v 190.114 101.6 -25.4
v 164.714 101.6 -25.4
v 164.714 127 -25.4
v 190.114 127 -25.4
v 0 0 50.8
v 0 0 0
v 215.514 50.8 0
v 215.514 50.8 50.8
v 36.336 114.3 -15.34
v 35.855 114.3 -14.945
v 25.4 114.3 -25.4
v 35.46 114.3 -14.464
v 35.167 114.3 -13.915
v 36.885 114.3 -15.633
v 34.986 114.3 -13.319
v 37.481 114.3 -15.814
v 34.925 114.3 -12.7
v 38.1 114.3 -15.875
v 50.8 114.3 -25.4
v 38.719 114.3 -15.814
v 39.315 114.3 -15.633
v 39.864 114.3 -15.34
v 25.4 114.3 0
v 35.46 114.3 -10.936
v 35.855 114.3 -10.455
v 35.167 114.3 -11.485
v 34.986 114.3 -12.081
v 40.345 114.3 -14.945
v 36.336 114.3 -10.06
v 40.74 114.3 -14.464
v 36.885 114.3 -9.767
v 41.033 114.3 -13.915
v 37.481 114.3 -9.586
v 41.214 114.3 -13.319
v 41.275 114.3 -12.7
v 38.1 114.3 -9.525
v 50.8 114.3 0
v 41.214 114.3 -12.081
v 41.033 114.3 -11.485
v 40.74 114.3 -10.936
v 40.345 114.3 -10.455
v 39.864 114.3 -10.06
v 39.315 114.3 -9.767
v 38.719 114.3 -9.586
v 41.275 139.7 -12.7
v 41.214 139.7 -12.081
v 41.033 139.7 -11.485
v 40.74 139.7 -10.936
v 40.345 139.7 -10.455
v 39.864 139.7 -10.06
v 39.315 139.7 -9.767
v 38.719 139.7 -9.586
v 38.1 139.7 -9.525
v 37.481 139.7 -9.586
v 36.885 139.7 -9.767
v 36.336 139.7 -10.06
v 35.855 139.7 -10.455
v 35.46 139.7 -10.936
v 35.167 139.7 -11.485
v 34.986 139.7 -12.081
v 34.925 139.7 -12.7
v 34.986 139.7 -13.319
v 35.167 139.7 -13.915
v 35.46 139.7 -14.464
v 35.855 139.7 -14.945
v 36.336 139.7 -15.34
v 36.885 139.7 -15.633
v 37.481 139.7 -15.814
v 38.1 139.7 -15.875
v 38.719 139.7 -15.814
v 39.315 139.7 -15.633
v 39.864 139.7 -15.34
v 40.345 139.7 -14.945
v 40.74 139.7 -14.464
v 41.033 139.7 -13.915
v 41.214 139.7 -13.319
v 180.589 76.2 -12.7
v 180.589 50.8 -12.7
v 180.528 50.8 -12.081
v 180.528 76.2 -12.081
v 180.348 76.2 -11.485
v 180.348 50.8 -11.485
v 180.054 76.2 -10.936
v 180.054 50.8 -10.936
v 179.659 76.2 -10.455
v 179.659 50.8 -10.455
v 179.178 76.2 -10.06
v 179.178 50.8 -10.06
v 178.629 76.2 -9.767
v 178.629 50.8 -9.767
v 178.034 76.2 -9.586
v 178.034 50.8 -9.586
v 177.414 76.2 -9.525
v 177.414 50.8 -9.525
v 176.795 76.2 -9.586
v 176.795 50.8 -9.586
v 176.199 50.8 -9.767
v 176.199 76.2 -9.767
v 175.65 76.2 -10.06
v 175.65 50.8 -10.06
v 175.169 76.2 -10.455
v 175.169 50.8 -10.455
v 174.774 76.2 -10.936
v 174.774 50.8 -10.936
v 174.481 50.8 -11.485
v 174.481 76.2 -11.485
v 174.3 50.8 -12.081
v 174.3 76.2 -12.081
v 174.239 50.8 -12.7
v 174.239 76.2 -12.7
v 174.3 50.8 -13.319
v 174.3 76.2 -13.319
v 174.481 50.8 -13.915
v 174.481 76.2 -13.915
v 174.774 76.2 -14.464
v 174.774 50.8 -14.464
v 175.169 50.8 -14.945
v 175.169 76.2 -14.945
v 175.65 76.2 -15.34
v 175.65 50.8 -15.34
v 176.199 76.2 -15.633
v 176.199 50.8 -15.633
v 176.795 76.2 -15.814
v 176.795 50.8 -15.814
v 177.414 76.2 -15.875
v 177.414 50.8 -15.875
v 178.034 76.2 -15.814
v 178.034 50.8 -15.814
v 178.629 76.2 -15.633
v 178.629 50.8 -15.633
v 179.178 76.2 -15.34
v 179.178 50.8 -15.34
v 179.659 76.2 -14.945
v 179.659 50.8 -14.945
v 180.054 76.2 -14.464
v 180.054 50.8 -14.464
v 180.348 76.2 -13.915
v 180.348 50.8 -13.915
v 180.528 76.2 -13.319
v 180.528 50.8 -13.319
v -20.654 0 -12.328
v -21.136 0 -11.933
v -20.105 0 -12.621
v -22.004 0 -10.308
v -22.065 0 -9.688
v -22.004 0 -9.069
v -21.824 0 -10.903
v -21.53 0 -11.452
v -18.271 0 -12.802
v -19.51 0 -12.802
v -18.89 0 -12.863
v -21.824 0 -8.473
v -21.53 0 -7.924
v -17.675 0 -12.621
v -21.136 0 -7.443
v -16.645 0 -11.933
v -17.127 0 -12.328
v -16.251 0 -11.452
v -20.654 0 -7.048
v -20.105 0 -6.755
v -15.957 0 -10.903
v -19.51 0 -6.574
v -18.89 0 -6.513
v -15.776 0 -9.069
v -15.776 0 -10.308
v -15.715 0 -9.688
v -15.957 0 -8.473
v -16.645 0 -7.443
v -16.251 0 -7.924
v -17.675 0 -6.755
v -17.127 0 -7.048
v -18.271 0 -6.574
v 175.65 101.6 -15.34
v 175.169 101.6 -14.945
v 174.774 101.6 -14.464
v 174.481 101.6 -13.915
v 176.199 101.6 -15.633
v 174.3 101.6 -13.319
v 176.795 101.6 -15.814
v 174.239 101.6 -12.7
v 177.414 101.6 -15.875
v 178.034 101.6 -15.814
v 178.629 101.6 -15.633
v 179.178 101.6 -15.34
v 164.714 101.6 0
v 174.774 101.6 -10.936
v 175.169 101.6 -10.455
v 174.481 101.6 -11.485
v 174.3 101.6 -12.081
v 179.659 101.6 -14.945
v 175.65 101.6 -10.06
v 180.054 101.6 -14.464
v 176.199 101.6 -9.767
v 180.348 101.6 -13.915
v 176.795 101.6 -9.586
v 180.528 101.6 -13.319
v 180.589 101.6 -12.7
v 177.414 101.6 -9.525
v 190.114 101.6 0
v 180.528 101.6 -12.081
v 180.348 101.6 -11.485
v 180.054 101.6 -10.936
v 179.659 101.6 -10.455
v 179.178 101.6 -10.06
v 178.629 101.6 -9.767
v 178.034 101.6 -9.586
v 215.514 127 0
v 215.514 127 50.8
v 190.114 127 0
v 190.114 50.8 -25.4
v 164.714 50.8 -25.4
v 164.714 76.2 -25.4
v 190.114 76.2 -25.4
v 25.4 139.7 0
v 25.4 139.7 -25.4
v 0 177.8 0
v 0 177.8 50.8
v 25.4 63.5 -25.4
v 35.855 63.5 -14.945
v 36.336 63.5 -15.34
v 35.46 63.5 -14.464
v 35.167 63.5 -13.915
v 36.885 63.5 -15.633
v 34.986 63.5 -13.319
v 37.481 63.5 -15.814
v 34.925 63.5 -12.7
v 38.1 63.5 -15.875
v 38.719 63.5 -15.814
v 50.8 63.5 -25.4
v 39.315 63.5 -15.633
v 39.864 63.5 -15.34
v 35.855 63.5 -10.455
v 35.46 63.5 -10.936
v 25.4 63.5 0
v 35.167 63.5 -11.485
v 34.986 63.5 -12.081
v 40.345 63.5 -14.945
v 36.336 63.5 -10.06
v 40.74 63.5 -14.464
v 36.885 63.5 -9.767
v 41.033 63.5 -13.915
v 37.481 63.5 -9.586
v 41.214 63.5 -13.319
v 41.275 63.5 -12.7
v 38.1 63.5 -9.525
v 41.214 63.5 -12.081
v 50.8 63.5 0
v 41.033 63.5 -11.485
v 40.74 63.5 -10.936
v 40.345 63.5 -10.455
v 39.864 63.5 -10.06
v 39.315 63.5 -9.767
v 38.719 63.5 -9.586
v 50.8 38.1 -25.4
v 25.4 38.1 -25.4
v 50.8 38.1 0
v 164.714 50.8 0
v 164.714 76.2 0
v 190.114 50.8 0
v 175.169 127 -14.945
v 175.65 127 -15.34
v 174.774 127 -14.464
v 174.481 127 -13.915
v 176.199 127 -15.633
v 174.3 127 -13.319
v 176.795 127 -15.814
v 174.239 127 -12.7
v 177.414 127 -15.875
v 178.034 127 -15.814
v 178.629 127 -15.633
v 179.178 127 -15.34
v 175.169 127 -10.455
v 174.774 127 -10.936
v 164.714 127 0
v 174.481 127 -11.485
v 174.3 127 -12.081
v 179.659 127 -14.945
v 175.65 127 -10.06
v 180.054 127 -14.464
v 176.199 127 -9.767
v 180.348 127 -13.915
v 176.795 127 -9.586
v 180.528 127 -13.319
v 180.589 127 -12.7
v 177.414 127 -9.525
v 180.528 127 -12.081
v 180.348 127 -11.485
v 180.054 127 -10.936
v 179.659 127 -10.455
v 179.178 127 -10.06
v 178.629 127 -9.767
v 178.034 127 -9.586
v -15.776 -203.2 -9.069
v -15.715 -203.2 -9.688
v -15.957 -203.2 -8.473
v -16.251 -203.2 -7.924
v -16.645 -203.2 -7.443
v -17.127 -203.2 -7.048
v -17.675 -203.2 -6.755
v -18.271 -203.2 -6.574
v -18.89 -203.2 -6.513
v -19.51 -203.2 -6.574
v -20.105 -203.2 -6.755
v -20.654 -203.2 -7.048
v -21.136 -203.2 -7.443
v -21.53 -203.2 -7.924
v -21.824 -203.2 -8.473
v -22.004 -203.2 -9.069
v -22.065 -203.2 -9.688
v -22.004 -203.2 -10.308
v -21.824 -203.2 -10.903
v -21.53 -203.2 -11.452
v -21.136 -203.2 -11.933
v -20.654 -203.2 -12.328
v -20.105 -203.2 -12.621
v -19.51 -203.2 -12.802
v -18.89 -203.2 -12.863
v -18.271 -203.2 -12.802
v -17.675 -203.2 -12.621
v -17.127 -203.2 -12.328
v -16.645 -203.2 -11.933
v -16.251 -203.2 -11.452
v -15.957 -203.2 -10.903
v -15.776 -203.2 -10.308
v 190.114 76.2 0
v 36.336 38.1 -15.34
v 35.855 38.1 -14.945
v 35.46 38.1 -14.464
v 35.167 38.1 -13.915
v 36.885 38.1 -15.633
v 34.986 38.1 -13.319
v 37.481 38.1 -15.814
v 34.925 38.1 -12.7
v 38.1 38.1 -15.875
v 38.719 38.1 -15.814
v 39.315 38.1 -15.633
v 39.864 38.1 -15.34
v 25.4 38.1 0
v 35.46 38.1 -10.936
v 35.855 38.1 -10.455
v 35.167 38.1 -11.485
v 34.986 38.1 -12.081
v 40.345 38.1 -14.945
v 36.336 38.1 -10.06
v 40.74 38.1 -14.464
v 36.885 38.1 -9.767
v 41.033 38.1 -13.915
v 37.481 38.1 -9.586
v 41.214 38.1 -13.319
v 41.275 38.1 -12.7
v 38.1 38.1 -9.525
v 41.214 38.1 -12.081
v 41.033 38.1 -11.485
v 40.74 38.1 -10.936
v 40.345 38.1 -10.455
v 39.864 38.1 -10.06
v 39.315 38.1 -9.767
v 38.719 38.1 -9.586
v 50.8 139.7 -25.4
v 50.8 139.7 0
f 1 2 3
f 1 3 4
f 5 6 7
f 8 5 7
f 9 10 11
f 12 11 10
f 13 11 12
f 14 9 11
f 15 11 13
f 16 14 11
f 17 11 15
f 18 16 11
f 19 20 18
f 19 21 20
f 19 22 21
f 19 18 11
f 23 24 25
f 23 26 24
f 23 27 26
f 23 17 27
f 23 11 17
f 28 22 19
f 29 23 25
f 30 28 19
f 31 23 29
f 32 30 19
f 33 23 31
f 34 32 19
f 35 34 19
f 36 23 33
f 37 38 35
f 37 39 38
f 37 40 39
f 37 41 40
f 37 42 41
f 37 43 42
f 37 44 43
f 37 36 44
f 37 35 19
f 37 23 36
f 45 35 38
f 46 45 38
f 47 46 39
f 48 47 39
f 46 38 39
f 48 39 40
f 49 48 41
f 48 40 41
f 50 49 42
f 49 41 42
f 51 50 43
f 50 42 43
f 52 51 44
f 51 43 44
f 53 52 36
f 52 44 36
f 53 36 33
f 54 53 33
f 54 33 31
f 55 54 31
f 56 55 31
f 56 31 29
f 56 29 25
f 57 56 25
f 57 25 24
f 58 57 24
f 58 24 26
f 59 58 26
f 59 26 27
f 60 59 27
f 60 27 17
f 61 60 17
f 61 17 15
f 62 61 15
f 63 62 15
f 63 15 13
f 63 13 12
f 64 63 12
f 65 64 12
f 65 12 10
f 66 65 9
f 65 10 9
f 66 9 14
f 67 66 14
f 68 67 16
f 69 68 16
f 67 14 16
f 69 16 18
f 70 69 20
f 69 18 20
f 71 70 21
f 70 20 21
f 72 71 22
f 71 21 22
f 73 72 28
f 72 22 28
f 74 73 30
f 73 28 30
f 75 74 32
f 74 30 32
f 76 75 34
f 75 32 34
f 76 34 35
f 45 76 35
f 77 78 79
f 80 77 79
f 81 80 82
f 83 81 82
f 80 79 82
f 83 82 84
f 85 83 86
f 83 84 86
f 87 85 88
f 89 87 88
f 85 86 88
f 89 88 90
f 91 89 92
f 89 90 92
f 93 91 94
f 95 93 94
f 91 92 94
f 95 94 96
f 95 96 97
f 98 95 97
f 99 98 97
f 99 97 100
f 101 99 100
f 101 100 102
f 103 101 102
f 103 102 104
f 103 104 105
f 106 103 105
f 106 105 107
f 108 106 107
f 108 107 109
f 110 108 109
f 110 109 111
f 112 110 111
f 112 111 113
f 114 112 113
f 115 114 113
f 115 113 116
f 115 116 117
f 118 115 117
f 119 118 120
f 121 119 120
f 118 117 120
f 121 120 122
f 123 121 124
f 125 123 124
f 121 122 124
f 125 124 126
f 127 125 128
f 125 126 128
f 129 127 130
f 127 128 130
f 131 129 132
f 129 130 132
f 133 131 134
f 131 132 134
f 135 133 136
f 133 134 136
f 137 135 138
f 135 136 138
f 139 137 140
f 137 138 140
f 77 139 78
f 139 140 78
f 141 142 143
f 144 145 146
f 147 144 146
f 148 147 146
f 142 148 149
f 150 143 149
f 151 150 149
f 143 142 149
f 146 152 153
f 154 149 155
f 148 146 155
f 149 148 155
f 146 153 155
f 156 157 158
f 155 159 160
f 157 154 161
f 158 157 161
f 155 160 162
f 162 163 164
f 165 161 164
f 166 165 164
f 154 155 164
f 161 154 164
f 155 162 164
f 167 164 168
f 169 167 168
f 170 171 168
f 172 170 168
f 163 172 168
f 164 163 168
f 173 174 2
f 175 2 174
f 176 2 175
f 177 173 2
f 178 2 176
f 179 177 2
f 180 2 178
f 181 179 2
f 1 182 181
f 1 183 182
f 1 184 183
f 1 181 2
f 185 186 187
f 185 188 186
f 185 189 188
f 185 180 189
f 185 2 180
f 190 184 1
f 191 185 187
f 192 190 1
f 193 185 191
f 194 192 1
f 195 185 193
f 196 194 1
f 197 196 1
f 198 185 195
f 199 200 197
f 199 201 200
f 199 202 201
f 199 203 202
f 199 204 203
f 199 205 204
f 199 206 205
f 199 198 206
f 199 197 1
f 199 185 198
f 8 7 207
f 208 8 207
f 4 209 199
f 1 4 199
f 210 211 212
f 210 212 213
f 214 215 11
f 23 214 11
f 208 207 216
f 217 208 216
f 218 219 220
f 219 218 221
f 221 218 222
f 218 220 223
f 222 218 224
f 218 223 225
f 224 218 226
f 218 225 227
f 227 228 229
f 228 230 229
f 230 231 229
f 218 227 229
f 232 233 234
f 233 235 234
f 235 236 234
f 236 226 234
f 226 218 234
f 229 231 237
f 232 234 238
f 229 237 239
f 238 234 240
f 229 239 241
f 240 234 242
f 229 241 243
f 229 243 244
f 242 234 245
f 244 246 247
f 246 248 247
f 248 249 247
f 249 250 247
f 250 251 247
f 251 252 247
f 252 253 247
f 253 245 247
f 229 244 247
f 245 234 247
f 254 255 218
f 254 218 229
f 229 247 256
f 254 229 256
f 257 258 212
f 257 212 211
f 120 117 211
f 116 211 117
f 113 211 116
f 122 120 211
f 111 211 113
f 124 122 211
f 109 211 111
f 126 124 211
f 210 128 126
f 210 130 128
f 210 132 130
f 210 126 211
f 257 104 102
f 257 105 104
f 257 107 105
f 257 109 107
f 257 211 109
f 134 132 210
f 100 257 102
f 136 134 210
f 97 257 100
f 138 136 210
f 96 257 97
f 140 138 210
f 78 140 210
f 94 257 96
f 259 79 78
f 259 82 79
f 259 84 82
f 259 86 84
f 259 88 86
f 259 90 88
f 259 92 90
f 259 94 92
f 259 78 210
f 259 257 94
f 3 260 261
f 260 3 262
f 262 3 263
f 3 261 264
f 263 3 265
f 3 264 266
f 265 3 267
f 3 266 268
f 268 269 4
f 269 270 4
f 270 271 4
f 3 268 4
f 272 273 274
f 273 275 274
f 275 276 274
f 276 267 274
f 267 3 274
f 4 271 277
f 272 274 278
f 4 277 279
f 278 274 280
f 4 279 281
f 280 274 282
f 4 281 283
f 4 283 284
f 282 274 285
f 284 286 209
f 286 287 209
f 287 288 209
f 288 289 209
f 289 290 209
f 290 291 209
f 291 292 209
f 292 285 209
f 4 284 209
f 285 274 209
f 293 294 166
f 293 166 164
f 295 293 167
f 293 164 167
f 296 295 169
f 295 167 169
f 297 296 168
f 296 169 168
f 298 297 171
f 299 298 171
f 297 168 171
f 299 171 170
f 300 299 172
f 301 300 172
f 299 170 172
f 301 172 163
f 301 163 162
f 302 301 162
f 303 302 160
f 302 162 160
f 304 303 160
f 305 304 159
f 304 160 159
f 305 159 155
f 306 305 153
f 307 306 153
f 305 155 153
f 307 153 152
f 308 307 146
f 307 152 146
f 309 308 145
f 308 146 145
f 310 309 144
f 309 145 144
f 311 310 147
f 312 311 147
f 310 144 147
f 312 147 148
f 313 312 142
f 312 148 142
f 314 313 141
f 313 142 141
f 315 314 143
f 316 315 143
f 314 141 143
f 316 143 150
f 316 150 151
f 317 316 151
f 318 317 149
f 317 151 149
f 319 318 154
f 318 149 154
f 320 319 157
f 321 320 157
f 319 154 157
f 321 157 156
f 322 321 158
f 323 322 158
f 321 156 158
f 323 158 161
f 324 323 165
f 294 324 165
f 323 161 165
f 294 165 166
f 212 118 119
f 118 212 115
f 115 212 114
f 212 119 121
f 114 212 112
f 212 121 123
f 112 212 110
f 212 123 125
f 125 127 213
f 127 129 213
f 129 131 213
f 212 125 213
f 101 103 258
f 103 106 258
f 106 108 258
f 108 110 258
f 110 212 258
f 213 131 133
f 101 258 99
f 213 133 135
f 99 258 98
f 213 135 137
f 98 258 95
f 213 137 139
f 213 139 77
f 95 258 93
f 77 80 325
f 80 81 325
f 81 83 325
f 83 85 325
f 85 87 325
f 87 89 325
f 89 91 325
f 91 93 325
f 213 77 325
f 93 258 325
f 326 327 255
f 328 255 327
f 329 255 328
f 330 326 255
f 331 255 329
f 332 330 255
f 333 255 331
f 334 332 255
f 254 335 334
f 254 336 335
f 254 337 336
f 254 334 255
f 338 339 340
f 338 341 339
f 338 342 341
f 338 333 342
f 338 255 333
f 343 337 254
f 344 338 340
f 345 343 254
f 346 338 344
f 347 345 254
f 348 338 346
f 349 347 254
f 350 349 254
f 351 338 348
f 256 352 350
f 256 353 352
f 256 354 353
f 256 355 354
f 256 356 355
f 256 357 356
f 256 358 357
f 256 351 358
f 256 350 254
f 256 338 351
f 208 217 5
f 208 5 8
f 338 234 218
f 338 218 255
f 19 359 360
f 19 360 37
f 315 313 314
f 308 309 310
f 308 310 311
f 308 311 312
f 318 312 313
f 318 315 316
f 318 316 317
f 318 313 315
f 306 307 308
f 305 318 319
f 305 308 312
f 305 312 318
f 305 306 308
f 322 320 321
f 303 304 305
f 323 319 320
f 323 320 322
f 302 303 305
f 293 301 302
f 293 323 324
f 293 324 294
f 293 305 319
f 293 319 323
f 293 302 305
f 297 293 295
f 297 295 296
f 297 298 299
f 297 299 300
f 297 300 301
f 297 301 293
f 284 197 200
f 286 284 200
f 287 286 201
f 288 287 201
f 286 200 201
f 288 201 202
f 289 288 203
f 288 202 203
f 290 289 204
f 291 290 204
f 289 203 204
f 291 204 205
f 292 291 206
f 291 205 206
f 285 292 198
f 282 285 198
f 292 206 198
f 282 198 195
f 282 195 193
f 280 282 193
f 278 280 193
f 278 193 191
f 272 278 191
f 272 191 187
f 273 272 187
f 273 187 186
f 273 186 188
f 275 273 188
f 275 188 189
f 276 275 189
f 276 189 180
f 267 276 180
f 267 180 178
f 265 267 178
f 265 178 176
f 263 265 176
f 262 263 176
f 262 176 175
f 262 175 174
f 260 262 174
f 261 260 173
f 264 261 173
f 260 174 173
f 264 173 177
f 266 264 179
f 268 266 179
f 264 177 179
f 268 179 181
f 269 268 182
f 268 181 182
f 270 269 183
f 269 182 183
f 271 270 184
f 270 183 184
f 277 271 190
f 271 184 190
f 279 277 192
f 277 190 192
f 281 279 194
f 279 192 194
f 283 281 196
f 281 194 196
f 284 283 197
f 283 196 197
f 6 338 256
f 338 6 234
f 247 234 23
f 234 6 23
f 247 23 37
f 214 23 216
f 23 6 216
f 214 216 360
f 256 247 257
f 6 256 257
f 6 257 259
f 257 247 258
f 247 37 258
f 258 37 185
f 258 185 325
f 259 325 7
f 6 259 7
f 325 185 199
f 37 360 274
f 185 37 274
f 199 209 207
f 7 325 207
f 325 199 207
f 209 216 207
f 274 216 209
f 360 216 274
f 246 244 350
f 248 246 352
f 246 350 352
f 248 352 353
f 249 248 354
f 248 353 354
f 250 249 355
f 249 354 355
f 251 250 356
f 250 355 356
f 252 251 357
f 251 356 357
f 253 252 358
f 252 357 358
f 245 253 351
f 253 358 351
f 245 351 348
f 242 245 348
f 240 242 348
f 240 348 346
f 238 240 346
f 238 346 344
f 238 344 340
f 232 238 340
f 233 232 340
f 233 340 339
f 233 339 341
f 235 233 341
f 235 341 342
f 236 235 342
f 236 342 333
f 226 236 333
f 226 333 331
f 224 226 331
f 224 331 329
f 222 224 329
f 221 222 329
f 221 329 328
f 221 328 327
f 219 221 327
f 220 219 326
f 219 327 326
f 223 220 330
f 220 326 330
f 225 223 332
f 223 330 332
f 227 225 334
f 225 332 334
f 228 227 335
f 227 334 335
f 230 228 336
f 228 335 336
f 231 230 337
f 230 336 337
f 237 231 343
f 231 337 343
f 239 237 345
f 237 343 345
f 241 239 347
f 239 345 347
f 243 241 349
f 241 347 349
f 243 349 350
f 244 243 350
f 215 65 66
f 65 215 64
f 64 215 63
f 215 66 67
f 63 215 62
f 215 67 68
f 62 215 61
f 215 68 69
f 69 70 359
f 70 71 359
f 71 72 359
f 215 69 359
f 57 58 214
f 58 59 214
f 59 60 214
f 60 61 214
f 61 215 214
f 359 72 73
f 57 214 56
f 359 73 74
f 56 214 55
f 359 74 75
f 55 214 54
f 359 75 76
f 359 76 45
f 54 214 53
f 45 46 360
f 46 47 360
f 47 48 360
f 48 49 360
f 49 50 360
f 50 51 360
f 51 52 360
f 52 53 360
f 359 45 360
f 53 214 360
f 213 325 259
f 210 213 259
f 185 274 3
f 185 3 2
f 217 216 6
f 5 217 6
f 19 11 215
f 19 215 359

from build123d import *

# Parameters (mm, degrees)
F1_DEPTH = 50.8
F2_W     = 25.4
F2_H     = 25.4
F3_DEPTH = 25.4
F4_R     = 3.175
F5_DEPTH = 177.801
F6_R     = 3.175
F7_DEPTH = 203.2


with BuildPart() as f1:
    # F0 (on Top) → F1 (new body)
    with BuildSketch(Plane.XY):
        Polygon((0, 177.8), (0, 0), (215.514203, 50.8), (215.514203, 127), align=None)
    extrude(amount=F1_DEPTH)

    # F2 (on face) → F3 (join)
    with BuildSketch(Plane(origin=(0, 0, 0), x_dir=(1, 0, 0), z_dir=(0, 0, -1))):
        with Locations((177.414203, -63.5)):
            Rectangle(F2_W, F2_H)
        with Locations((177.414203, -114.3)):
            Rectangle(F2_W, F2_H)
        with Locations((38.1, -50.8)):
            Rectangle(F2_W, F2_H)
        with Locations((38.1, -127)):
            Rectangle(F2_W, F2_H)
    extrude(amount=F3_DEPTH)

    # F4 (on Front) → F5 (cut, through all)
    with BuildSketch(Plane.XZ):
        with Locations((38.1, -12.7)):
            Circle(F4_R)
        with Locations((177.414203, -12.7)):
            Circle(F4_R)
    extrude(amount=-F5_DEPTH, mode=Mode.SUBTRACT)


with BuildPart() as f7:
    # F6 (on Front) → F7 (new body)
    with BuildSketch(Plane.XZ):
        with Locations((-18.890467, -9.688093)):
            Circle(F6_R)
    extrude(amount=F7_DEPTH)


solid = Compound([f1.part, f7.part])
